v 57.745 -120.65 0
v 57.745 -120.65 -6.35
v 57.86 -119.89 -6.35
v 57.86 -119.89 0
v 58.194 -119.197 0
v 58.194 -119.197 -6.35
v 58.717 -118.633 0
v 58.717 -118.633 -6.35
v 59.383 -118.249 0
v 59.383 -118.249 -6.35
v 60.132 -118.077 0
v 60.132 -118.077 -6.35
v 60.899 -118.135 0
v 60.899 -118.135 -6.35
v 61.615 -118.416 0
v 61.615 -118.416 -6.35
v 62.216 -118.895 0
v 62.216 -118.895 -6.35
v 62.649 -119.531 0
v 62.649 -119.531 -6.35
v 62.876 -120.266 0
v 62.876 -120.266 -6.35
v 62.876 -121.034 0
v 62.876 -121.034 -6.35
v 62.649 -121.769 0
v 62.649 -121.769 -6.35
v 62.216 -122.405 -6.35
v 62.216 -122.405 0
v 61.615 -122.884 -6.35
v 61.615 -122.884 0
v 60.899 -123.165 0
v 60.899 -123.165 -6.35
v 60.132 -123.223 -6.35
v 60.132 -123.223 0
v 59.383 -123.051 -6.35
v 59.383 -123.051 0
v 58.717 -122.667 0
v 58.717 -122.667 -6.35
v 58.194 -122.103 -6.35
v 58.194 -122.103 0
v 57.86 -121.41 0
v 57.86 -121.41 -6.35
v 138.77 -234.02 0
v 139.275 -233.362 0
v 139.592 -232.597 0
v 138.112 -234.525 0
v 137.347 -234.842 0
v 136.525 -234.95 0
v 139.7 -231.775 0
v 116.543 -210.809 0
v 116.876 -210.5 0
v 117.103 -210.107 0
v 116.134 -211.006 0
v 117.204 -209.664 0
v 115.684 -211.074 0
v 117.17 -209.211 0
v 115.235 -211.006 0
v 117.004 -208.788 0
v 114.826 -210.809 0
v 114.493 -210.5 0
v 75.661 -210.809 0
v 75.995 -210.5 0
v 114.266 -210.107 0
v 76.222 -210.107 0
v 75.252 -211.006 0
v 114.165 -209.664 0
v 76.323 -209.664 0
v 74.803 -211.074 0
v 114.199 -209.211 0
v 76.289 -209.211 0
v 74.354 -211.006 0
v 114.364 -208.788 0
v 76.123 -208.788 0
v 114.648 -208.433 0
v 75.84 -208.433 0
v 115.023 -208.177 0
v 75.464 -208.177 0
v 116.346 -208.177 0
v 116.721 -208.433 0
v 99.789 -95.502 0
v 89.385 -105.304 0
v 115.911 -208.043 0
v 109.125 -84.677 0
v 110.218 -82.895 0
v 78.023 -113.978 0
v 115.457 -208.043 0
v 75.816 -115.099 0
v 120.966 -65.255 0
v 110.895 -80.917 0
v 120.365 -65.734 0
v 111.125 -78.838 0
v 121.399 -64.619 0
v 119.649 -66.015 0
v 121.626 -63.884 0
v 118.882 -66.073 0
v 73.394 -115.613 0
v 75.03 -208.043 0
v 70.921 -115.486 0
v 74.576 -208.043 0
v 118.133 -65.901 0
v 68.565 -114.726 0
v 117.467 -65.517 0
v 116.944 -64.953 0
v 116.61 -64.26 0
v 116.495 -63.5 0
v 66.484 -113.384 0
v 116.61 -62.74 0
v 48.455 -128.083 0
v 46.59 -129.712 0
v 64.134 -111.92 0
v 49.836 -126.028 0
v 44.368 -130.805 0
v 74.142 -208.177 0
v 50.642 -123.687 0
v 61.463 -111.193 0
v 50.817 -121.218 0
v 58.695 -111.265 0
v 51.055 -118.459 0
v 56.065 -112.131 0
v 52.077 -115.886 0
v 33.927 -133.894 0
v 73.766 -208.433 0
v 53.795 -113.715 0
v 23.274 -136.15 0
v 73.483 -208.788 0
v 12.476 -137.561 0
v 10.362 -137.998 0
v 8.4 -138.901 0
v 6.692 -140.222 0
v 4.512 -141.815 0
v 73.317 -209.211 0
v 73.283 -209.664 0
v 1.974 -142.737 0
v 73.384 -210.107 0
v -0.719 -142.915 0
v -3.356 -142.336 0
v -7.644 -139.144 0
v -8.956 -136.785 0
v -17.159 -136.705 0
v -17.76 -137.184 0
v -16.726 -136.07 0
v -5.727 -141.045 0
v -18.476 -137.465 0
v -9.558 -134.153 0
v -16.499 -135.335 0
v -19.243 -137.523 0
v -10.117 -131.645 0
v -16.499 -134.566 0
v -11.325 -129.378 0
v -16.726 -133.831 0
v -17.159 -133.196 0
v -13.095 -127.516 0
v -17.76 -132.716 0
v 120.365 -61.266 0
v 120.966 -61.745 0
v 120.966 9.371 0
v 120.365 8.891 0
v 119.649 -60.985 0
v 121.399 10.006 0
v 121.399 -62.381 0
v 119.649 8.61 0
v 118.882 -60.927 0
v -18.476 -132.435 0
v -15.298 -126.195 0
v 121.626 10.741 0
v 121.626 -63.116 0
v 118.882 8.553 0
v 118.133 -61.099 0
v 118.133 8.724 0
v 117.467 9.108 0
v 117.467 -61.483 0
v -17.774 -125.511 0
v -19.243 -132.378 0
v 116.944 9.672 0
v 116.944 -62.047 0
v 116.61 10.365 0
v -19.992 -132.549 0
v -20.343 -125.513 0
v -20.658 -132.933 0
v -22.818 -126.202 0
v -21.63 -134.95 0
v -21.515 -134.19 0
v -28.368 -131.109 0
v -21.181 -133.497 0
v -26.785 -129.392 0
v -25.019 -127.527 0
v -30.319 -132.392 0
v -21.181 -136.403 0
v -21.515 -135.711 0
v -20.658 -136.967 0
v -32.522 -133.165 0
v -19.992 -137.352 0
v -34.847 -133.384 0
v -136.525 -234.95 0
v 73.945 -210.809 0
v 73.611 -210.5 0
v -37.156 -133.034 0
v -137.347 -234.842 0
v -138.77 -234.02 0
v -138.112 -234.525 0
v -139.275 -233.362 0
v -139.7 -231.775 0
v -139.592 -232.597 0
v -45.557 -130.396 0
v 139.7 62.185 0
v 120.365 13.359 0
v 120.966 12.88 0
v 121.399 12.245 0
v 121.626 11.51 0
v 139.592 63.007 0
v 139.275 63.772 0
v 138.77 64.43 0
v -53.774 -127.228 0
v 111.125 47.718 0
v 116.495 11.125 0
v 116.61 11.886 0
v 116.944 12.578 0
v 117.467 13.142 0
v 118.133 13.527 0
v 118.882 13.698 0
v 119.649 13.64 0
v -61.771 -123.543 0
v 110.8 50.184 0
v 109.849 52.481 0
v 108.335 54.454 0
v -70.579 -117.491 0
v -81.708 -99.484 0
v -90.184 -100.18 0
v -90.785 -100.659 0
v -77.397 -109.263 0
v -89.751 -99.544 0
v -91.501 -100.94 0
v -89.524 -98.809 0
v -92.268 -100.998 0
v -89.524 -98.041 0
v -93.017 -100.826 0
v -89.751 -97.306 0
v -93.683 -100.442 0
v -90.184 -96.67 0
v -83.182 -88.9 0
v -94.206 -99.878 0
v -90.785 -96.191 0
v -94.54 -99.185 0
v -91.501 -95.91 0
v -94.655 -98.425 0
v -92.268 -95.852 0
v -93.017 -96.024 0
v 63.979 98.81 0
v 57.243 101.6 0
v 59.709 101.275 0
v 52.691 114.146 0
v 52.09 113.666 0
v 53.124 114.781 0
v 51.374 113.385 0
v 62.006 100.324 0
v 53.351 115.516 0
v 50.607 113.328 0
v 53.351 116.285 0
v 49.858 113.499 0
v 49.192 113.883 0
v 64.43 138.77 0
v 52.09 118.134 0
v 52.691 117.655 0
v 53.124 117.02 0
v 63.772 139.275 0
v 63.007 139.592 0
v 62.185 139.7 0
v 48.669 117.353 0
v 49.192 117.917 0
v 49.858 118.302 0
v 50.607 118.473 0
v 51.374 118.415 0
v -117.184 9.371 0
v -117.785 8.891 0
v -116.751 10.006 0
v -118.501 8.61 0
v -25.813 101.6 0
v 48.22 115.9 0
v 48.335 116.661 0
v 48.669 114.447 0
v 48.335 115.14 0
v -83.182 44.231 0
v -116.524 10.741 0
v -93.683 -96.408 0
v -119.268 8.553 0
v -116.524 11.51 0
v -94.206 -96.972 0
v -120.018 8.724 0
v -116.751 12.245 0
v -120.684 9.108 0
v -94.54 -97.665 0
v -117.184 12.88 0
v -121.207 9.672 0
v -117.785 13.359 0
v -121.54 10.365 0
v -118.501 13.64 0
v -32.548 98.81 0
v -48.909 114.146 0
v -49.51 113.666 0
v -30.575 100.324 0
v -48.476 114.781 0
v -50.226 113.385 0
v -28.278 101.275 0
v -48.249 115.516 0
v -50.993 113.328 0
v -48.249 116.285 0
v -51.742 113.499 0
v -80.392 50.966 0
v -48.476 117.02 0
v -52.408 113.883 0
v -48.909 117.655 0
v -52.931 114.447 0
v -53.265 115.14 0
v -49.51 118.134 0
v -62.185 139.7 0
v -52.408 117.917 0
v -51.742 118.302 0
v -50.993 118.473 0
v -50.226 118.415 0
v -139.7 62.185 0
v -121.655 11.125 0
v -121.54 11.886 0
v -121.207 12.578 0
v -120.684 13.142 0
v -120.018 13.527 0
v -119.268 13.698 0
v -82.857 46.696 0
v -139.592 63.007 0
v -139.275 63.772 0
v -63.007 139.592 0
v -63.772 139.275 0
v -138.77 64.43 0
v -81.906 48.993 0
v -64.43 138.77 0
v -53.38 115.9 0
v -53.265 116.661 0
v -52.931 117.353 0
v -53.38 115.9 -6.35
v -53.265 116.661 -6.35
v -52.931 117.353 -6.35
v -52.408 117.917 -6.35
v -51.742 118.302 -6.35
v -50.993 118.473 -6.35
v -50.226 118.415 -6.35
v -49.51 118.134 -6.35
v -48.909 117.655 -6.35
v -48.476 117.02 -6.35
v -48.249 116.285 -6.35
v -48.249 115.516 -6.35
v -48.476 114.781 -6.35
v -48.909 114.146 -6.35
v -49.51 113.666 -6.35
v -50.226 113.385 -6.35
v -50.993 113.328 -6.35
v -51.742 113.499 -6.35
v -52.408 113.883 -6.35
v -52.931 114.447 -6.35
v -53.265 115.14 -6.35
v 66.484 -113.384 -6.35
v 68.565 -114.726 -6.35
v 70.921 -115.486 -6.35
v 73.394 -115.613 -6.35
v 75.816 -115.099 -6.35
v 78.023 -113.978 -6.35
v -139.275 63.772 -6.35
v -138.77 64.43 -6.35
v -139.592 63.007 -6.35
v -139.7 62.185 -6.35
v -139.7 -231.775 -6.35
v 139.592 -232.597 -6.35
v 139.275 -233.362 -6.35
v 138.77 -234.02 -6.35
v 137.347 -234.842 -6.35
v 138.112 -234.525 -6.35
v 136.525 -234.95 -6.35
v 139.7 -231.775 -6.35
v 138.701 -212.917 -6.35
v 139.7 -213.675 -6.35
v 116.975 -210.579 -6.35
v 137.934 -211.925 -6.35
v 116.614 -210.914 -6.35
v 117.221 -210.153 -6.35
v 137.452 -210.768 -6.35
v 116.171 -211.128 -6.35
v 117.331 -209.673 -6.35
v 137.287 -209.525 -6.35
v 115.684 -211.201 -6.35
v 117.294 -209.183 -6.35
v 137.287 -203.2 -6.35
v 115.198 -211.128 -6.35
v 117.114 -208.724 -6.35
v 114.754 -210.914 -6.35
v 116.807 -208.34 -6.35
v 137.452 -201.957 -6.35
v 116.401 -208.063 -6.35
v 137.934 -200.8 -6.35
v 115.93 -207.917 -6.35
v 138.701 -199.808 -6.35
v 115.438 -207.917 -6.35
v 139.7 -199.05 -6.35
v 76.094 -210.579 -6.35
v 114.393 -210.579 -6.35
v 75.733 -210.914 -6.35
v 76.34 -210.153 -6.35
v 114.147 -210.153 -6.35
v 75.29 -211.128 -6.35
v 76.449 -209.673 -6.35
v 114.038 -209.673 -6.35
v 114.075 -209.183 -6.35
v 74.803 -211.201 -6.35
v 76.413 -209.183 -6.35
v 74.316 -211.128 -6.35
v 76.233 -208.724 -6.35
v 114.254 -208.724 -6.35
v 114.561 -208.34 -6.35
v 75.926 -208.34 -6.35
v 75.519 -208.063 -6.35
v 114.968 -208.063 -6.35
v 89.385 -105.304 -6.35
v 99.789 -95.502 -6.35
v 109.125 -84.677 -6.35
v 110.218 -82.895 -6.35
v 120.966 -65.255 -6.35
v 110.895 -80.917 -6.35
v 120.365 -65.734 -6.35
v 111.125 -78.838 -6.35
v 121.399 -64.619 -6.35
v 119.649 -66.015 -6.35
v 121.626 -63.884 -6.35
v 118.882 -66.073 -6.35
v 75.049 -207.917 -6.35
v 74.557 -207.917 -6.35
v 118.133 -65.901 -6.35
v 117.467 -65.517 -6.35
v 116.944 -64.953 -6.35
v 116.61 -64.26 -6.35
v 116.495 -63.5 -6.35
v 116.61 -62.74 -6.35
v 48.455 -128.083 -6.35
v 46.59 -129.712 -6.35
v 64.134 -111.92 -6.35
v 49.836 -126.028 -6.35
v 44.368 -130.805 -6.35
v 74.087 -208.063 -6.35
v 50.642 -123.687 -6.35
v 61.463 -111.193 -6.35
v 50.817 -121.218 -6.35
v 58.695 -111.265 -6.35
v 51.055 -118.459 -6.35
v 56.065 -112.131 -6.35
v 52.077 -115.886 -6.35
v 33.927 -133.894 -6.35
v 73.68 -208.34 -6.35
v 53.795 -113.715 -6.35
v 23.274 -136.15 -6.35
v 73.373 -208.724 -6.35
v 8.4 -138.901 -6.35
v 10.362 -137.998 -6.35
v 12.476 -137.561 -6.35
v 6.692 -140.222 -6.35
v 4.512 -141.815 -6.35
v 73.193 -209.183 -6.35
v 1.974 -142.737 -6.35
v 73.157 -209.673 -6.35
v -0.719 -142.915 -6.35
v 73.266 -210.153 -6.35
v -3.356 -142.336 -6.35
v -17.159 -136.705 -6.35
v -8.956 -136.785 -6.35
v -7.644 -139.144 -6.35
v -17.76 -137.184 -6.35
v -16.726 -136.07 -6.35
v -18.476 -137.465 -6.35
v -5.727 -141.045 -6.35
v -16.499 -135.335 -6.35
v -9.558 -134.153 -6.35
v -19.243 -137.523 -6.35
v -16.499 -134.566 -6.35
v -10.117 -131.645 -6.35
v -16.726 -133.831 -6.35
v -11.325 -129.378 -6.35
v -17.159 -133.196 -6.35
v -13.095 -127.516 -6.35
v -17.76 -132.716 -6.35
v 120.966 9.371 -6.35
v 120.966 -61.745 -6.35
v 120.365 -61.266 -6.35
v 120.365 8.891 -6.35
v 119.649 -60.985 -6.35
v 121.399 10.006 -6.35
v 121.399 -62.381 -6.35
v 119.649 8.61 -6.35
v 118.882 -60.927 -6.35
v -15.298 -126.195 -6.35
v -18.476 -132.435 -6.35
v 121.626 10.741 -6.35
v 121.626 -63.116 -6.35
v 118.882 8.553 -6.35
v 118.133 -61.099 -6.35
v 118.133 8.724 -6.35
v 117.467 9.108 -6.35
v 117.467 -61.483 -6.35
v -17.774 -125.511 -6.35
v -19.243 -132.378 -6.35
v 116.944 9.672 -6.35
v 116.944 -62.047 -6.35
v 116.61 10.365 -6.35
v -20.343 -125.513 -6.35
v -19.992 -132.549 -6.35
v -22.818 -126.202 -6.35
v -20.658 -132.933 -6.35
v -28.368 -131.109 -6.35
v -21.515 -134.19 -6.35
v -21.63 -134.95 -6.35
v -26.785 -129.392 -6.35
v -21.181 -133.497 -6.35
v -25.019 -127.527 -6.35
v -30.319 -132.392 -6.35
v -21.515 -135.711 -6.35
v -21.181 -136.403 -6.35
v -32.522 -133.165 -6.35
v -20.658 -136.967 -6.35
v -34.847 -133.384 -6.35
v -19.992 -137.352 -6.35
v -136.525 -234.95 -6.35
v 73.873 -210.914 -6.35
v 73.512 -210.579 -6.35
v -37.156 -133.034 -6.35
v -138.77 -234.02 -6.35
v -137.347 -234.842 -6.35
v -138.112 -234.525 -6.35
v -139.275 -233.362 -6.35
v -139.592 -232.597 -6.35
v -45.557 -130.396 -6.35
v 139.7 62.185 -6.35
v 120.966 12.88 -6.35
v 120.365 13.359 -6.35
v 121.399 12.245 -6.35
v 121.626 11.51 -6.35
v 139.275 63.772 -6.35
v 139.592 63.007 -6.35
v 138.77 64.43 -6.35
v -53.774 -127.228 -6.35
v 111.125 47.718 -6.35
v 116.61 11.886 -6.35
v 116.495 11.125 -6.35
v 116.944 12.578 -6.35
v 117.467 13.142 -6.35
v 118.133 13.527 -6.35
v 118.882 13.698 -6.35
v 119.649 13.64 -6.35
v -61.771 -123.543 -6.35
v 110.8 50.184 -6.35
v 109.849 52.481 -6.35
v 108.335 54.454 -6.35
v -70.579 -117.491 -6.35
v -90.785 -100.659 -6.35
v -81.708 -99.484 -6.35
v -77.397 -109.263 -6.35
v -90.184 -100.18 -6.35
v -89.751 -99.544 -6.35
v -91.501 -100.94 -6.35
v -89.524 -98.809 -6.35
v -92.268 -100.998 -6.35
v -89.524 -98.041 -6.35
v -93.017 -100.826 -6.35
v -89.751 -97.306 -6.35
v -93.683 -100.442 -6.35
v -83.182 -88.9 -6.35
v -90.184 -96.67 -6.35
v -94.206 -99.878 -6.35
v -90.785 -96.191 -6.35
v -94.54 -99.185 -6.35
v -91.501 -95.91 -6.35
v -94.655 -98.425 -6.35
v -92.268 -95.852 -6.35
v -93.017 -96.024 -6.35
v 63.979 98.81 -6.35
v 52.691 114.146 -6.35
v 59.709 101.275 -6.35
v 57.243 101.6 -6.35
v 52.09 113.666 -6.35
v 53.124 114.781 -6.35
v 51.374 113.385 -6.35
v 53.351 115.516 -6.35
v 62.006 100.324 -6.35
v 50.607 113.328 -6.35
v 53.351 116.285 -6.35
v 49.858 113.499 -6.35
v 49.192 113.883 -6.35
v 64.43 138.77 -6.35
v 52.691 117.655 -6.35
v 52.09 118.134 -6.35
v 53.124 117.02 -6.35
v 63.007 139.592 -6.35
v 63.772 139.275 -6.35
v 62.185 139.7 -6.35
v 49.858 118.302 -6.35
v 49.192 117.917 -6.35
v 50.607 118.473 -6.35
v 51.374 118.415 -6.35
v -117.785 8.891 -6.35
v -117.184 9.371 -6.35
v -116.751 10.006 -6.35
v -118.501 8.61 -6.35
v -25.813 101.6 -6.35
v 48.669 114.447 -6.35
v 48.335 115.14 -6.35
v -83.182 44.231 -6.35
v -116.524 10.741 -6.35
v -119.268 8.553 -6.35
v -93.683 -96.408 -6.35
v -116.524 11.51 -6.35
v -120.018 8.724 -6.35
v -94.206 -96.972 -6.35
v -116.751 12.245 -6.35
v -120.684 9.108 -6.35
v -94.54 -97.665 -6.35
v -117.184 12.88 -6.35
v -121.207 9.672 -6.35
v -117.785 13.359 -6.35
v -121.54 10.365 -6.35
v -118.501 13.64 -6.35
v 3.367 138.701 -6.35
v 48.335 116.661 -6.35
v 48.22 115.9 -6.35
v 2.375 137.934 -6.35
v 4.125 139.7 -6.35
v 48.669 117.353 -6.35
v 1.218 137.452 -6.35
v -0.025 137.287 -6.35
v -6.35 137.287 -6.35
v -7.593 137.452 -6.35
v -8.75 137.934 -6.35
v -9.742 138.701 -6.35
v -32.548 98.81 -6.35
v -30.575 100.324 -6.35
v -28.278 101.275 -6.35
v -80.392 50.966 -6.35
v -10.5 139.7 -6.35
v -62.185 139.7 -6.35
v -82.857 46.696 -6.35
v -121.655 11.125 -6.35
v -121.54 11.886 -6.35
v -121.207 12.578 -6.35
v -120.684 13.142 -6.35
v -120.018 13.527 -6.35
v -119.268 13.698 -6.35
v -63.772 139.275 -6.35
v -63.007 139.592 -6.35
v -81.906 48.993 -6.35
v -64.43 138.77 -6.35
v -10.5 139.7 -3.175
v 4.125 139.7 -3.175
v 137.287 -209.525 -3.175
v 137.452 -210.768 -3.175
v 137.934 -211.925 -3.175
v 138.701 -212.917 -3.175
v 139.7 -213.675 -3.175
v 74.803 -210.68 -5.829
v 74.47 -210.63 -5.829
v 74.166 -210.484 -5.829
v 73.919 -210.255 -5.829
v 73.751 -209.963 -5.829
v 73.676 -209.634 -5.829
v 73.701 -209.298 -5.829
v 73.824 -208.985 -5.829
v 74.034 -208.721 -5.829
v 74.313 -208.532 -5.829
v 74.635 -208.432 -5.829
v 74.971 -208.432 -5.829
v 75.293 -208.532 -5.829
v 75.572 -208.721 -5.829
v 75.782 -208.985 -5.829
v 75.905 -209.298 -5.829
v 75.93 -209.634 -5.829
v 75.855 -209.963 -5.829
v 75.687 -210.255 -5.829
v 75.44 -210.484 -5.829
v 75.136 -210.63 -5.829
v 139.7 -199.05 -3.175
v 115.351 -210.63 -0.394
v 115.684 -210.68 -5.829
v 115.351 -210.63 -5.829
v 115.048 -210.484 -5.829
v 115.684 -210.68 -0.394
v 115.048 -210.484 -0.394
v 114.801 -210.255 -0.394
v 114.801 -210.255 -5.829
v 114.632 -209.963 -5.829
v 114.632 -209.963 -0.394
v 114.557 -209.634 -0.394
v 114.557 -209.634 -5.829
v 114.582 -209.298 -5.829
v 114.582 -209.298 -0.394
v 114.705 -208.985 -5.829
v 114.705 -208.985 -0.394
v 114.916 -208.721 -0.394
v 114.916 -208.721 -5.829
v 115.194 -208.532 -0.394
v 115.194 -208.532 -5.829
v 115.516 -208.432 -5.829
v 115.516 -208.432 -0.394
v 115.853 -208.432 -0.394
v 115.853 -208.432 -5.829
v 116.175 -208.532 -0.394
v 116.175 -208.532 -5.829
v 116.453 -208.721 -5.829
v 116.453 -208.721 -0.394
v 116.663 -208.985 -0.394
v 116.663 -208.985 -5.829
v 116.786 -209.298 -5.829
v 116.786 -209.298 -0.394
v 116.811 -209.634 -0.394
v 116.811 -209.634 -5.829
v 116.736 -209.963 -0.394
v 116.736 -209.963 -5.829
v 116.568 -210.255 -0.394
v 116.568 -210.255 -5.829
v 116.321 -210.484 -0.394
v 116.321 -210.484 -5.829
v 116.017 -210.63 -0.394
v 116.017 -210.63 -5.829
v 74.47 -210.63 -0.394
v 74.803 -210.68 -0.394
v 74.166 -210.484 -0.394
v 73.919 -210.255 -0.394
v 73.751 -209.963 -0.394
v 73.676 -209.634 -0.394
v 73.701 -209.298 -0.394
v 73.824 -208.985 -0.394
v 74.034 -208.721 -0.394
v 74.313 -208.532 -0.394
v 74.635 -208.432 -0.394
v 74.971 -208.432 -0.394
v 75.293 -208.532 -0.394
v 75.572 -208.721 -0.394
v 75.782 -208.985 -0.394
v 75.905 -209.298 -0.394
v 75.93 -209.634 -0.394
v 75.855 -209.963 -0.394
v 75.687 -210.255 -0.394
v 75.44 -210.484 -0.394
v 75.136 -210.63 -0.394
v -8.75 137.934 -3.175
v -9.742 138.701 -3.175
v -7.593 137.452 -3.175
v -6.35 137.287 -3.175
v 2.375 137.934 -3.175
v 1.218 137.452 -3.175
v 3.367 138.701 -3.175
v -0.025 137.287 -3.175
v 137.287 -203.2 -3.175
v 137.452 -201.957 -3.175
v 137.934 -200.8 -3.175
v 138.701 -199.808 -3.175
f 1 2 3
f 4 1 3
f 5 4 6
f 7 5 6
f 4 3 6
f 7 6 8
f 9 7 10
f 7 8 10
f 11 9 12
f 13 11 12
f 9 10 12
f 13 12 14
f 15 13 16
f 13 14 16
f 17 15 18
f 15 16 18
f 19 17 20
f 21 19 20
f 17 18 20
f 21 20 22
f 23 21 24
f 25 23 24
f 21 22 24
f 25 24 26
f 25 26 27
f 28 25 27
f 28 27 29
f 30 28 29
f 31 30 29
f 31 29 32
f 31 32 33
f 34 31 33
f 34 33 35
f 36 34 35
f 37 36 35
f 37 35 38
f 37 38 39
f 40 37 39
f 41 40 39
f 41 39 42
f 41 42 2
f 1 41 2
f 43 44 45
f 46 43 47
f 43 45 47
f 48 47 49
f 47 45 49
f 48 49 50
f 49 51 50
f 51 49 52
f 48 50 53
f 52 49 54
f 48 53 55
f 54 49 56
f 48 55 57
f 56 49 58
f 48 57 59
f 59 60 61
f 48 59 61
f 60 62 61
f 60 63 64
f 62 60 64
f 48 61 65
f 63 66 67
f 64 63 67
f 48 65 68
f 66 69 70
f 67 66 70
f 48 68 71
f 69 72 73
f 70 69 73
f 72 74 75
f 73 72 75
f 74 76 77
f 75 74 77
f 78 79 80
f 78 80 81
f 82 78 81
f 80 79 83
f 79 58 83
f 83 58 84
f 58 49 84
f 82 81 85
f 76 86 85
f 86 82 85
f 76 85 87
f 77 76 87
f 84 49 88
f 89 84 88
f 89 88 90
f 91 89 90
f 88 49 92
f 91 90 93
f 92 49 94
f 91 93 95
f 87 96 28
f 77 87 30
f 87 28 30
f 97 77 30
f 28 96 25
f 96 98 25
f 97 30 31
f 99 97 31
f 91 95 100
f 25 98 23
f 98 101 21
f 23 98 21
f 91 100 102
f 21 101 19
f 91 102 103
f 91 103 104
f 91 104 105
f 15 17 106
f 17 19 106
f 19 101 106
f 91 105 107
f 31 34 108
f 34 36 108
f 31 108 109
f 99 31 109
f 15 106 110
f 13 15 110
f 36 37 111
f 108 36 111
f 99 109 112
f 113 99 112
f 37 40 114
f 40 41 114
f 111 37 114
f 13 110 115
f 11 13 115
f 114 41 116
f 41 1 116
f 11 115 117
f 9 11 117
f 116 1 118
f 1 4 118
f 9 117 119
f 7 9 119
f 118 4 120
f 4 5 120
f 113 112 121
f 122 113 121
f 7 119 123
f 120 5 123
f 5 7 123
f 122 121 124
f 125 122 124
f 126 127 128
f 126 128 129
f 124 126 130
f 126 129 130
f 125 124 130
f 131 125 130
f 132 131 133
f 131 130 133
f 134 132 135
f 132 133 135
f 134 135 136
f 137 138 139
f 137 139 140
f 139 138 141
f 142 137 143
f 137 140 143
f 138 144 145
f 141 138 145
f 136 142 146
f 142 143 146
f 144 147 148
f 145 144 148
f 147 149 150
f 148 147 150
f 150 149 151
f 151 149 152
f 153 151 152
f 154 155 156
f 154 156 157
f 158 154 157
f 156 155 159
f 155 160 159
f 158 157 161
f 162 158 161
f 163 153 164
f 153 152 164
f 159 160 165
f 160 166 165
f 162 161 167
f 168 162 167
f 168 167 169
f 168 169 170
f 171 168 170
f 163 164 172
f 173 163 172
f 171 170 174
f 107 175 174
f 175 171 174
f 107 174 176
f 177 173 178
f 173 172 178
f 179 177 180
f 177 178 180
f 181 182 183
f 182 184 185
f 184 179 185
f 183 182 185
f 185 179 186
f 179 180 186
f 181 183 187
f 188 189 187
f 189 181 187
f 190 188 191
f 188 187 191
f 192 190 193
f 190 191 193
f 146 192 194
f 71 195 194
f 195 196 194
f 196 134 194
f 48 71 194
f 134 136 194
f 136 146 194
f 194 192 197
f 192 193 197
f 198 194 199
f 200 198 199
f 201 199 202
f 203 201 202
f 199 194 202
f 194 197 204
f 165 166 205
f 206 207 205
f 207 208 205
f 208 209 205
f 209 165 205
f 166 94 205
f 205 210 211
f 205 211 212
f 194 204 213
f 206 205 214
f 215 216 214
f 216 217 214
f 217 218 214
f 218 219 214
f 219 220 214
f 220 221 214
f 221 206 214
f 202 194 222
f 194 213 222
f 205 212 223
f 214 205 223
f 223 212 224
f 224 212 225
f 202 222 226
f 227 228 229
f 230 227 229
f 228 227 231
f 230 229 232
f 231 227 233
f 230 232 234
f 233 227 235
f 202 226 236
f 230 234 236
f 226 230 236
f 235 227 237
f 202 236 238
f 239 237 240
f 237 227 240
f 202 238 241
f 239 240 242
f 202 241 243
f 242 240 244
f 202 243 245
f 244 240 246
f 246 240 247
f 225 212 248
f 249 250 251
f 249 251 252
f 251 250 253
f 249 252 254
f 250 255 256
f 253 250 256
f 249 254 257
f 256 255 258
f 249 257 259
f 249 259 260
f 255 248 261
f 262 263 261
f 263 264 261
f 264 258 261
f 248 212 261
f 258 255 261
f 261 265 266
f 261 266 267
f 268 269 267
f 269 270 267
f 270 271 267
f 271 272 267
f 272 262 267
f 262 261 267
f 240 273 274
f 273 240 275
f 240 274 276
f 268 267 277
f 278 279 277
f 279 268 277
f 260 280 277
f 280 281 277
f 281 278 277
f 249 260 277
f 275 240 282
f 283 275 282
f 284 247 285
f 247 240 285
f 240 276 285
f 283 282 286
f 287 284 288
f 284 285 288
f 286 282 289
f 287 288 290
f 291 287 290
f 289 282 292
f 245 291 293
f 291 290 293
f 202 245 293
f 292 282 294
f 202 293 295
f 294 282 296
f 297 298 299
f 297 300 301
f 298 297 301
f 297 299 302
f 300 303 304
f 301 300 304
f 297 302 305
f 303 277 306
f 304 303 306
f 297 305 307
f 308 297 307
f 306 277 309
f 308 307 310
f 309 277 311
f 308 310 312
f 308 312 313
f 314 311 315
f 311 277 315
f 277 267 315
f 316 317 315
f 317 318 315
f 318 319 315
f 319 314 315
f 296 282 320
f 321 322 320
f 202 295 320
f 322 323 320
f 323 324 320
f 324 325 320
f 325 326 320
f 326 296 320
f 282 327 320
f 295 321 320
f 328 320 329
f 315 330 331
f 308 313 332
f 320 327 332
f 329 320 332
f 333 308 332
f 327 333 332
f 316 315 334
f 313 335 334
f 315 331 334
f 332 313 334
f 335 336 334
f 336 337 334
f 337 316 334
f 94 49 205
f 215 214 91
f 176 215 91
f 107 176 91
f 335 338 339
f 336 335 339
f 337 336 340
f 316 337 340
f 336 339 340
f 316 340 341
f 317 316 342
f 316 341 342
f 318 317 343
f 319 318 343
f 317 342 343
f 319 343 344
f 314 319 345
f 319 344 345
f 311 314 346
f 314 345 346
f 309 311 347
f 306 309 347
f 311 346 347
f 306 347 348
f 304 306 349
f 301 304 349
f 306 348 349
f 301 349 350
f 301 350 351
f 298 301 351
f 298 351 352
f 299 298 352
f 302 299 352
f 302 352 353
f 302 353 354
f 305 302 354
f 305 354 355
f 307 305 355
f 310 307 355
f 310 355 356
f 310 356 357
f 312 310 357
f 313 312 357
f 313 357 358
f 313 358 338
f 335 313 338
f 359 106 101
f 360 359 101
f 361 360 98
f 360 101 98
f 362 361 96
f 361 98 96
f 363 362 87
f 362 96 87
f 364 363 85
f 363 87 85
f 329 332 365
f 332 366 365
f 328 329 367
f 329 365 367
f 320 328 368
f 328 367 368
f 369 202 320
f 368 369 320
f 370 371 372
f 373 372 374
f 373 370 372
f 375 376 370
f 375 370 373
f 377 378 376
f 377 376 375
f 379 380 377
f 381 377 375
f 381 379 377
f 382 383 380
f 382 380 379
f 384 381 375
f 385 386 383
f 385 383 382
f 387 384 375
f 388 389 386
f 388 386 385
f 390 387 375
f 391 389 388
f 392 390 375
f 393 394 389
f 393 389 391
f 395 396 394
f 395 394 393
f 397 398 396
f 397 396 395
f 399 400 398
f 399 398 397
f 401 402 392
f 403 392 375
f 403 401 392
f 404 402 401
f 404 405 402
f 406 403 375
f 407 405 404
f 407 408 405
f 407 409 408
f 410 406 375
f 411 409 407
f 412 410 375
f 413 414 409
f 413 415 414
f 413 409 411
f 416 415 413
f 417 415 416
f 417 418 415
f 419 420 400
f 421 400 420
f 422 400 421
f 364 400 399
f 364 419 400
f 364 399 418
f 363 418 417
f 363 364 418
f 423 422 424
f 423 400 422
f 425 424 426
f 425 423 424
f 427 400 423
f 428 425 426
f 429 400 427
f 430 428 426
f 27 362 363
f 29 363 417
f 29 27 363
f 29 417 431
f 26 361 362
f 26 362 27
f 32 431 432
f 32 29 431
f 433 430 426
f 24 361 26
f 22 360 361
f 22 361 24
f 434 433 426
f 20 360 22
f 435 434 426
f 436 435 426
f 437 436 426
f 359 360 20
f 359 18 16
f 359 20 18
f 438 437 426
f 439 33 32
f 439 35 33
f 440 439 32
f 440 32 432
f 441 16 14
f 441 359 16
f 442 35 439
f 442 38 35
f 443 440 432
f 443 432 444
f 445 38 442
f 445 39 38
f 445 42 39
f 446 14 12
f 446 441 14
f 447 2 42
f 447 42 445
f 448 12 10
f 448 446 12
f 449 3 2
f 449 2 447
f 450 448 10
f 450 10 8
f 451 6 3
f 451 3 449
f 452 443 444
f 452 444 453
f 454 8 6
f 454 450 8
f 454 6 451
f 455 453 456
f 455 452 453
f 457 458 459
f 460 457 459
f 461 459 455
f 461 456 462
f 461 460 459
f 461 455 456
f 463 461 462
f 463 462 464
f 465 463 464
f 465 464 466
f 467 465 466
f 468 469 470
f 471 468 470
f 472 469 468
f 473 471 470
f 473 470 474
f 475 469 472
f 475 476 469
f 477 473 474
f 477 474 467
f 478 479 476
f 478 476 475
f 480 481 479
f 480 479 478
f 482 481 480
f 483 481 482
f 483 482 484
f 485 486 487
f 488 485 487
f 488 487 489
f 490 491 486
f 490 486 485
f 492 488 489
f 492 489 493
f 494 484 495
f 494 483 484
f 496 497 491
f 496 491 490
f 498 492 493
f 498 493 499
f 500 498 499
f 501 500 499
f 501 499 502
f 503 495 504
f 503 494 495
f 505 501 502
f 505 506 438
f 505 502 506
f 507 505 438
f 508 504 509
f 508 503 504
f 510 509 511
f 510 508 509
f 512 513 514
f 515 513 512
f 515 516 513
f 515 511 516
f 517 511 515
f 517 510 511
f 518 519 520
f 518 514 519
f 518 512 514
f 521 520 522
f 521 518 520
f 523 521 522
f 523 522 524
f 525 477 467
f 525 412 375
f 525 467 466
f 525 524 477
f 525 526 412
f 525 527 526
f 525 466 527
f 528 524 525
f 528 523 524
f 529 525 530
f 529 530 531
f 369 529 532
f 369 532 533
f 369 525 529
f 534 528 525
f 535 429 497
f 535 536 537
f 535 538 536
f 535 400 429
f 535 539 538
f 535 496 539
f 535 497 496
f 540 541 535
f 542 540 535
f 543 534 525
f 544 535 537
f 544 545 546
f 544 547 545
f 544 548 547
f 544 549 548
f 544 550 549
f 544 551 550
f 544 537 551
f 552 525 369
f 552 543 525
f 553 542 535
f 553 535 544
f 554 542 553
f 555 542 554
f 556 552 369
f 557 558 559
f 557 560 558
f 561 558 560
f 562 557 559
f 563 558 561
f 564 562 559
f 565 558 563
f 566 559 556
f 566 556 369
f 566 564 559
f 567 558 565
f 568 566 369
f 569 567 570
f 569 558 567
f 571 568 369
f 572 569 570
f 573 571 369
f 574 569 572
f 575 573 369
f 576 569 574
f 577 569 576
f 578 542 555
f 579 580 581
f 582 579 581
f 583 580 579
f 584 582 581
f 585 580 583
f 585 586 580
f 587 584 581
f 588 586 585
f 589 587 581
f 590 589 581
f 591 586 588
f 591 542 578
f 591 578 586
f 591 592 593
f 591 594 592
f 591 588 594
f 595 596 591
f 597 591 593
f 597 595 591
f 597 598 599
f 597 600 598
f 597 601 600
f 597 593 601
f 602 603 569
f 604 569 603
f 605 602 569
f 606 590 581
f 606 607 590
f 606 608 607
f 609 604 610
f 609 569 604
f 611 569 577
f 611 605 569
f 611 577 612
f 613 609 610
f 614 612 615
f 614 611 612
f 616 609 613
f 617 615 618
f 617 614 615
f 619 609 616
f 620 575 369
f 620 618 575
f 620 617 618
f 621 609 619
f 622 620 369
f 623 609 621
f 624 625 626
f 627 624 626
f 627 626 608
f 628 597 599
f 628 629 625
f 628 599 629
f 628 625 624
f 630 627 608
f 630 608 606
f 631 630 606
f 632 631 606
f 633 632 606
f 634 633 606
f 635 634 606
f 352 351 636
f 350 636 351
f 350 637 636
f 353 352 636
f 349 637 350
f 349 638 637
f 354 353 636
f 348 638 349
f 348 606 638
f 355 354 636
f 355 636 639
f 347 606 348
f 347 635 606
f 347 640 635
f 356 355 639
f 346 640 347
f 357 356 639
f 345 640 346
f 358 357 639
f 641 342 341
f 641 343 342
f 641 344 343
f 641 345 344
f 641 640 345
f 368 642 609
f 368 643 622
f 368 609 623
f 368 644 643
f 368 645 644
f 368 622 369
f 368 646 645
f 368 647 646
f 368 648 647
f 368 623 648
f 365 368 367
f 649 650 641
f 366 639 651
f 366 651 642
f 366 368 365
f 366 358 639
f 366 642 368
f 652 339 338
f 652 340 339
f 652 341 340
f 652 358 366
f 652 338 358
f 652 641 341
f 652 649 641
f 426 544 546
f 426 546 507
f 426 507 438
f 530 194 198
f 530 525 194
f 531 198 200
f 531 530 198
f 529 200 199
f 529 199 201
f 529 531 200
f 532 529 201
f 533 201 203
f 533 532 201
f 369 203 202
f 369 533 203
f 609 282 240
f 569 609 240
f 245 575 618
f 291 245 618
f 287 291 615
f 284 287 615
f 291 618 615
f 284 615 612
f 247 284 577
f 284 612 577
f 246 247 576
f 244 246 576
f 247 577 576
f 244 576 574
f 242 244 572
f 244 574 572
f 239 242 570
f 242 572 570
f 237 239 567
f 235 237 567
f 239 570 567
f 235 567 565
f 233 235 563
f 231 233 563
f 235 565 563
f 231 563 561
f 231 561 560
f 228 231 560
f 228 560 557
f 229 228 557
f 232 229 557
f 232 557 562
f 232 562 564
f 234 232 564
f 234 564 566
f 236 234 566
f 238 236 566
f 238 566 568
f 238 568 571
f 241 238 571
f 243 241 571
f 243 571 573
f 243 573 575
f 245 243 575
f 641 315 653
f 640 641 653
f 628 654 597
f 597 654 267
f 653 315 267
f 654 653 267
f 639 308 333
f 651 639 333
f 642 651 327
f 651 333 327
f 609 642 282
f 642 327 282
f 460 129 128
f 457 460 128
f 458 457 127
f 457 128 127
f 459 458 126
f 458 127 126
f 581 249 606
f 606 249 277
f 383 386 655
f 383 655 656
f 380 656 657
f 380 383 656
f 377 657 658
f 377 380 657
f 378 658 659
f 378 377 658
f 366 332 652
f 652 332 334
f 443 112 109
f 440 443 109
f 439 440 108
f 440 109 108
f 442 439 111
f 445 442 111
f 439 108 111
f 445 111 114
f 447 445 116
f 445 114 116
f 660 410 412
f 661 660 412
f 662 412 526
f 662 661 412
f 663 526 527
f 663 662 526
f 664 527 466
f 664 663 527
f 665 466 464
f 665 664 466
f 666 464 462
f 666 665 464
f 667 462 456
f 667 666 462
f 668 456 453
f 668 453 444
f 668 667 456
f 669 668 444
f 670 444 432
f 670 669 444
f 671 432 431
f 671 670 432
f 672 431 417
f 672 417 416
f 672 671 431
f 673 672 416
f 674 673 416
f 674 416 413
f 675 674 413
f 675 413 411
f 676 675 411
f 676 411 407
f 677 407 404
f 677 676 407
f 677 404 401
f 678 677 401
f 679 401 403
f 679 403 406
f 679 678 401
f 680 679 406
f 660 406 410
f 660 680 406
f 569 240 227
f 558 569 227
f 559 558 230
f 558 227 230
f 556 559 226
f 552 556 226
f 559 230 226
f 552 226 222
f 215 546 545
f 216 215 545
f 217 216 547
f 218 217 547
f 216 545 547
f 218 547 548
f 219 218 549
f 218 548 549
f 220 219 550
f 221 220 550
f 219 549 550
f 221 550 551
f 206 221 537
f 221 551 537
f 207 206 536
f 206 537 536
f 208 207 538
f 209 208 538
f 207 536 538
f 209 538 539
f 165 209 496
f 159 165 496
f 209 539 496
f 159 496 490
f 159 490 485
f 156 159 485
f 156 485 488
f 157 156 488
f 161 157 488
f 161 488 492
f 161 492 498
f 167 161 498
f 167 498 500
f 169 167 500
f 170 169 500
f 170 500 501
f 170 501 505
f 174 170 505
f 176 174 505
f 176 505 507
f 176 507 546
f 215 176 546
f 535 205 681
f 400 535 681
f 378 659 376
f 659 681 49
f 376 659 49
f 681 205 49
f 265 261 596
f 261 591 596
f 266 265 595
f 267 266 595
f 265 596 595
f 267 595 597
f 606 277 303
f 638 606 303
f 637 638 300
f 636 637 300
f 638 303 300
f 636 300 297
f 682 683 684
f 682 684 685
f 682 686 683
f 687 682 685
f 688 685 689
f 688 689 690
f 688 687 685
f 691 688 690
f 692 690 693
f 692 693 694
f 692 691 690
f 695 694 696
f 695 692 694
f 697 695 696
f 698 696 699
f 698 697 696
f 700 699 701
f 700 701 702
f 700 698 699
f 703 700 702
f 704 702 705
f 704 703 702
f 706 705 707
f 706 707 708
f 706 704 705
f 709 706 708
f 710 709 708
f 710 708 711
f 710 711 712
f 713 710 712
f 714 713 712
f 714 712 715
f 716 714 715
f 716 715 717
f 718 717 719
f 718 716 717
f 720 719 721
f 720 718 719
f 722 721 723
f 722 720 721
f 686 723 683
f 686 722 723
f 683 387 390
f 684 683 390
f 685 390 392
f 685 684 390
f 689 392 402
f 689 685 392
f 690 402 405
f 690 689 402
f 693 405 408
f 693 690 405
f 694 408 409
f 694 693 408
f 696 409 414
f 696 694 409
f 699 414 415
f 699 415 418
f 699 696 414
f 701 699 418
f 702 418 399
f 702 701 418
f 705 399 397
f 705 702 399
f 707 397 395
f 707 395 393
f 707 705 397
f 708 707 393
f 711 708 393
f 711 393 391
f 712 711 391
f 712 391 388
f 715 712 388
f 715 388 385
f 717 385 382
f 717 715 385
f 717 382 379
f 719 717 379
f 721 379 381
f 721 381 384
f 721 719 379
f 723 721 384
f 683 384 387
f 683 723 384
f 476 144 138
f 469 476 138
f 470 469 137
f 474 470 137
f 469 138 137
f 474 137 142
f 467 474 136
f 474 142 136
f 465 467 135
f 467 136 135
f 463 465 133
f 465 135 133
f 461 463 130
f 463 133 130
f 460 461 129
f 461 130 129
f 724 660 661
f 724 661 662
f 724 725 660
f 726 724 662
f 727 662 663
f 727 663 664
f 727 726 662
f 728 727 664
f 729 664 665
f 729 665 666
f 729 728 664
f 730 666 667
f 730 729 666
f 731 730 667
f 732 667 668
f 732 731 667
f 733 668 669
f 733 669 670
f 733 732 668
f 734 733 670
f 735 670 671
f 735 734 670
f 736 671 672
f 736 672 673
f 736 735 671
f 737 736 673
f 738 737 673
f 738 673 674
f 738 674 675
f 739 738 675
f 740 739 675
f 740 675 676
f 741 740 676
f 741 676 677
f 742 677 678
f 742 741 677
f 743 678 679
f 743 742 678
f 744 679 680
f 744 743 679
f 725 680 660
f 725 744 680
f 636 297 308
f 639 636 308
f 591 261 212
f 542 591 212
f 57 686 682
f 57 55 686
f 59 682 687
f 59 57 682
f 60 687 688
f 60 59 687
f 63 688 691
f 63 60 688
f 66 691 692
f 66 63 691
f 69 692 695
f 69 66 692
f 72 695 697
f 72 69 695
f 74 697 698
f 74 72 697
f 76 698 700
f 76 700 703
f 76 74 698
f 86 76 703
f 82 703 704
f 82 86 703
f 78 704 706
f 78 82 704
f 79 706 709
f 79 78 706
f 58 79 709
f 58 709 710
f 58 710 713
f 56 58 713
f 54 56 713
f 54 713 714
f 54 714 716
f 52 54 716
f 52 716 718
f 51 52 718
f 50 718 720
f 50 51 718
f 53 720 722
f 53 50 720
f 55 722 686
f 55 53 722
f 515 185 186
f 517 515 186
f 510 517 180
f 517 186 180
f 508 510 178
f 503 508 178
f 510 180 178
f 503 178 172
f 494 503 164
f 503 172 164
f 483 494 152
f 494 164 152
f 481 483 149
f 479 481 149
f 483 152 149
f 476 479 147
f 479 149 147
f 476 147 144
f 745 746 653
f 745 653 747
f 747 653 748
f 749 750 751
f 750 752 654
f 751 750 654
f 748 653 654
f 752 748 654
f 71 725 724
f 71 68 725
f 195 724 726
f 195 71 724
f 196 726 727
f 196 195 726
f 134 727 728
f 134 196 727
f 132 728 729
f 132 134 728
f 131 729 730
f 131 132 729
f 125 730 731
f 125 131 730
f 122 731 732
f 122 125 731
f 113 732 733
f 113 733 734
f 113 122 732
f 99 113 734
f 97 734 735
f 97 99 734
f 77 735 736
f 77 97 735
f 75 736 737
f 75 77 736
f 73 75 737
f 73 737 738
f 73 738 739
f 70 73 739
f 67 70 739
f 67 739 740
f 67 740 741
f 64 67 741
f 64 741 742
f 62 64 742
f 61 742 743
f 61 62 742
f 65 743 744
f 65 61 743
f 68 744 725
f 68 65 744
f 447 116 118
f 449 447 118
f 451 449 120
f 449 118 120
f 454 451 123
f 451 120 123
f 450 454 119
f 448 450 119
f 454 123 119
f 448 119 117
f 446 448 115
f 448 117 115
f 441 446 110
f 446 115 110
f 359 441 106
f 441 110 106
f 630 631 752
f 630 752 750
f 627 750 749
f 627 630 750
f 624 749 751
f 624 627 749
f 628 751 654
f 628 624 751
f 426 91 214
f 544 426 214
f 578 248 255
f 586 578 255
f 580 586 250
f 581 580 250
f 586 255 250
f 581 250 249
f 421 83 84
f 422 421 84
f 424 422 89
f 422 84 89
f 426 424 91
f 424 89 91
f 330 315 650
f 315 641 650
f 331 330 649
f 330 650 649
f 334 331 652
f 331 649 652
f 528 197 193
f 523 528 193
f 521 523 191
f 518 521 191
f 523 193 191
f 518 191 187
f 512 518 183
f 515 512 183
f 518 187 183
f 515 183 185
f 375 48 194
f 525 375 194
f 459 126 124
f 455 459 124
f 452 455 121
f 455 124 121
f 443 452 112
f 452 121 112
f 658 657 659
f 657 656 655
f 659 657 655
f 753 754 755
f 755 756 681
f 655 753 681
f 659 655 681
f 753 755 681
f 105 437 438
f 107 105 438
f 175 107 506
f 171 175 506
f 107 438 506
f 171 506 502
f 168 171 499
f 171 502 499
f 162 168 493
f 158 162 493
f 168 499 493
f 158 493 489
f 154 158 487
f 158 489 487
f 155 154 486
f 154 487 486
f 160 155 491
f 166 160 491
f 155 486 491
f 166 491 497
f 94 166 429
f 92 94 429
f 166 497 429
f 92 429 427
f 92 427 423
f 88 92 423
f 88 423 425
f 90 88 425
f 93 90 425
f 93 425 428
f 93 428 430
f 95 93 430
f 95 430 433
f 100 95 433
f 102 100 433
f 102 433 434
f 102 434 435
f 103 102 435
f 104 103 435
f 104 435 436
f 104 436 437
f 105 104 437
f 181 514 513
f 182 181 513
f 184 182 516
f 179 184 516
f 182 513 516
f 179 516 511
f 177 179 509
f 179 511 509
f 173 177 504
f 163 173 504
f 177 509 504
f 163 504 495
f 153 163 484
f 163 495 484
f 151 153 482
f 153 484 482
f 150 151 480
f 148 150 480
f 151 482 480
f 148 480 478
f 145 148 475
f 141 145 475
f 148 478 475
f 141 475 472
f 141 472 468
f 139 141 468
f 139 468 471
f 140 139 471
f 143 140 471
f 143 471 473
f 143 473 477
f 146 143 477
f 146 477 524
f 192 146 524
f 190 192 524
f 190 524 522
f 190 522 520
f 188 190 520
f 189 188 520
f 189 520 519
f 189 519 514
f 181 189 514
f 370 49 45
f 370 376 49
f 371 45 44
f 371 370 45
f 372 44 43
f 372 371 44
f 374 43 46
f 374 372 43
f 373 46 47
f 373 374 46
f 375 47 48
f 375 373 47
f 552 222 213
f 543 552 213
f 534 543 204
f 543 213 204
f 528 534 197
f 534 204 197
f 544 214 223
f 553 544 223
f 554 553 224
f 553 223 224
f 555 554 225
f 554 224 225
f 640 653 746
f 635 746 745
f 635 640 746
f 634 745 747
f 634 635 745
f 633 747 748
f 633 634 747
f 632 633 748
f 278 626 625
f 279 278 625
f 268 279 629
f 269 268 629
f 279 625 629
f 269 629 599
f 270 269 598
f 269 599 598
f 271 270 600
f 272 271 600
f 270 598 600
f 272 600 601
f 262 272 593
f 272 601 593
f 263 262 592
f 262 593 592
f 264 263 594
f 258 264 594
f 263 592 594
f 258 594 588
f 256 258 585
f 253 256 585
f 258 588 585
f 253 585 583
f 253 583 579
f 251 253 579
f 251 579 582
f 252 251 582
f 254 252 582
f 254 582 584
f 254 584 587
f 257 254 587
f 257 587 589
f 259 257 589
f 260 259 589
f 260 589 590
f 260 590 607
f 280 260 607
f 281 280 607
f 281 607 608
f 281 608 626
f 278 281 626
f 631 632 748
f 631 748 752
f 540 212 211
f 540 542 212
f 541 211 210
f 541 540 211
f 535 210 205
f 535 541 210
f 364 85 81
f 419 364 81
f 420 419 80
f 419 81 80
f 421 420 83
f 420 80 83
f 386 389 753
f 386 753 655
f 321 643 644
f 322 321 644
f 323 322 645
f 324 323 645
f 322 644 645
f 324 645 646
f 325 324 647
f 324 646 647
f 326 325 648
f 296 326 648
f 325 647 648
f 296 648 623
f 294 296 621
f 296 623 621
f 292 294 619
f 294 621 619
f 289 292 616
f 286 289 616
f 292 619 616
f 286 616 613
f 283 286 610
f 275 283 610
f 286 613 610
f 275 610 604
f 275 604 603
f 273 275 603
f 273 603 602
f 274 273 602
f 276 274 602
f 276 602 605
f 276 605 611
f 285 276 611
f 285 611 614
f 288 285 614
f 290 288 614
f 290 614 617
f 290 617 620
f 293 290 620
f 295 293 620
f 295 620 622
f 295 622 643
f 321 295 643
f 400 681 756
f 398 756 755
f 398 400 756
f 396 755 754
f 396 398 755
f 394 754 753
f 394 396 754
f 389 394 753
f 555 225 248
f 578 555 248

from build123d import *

# Parameters (mm, degrees)
BOSS_EXTRUDE1_DEPTH              = 6.35
F_13_64_0_20313_DIAMETER_HOLE1_D = 5.159502
FILLET1_R                        = 3.175
CUT_EXTRUDE1_DEPTH               = 3.175
F_4_40_TAPPED_HOLE1_AT_2_COUNT   = 2
F_4_40_TAPPED_HOLE1_AT_2_PITCH   = 40.8813


with BuildPart() as part:
    # Sketch1 → Boss-Extrude1 (new body)
    with BuildSketch(Plane.XY):
        Polygon((63.5, 139.7), (139.7, 63.5), (139.7, -234.95), (-139.7, -234.95), (-139.7, 63.5), (-63.5, 139.7), align=None)
        with BuildLine():
            Line((-32.547758941, 98.810192091), (-80.392170491, 50.965780541))
            ThreePointArc((-80.392170491, 50.965780541), (-82.456930947, 47.875648143), (-83.1819784, 44.23058845))
            Line((-83.1819784, 44.23058845), (-83.1819784, -88.9))
            ThreePointArc((-83.1819784, -88.9), (-77.397388735, -109.262606079), (-61.771467321, -123.542934642))
            ThreePointArc((-61.771467321, -123.542934642), (-49.690626762, -128.877509625), (-37.155545476, -133.033966773))
            ThreePointArc((-37.155545476, -133.033966773), (-31.397184902, -132.845734548), (-26.785398712, -129.39239182))
            ThreePointArc((-26.785398712, -129.39239182), (-16.51294166, -125.769298085), (-9.558427406, -134.152907902))
            ThreePointArc((-9.558427406, -134.152907902), (-3.356200416, -142.335772885), (6.691703581, -140.222357584))
            ThreePointArc((6.691703581, -140.222357584), (9.354962656, -138.393777353), (12.476251165, -137.560583133))
            ThreePointArc((12.476251165, -137.560583133), (28.622348201, -135.127095945), (44.368454999, -130.805241011))
            ThreePointArc((44.368454999, -130.805241011), (49.212504081, -127.100822664), (50.816921447, -121.217509676))
            ThreePointArc((50.816921447, -121.217509676), (56.065290503, -112.130581006), (66.483854873, -113.384042964))
            ThreePointArc((66.483854873, -113.384042964), (72.153155683, -115.630496863), (78.02311981, -113.977908606))
            ThreePointArc((78.02311981, -113.977908606), (94.714050954, -100.537651788), (109.125182698, -84.677419518))
            ThreePointArc((109.125182698, -84.677419518), (110.611187219, -81.924253334), (111.125, -78.838134428))
            Line((111.125, -78.838134428), (111.125, 47.718463274))
            ThreePointArc((111.125, 47.718463274), (110.399952547, 51.363522967), (108.335192091, 54.453655364))
            Line((108.335192091, 54.453655364), (63.978655364, 98.810192091))
            ThreePointArc((63.978655364, 98.810192091), (60.888522967, 100.874952547), (57.243463274, 101.6))
            Line((57.243463274, 101.6), (-25.81256685, 101.6))
            ThreePointArc((-25.81256685, 101.6), (-29.457626543, 100.874952547), (-32.547758941, 98.810192091))
        make_face(mode=Mode.SUBTRACT)
    extrude(amount=-BOSS_EXTRUDE1_DEPTH)

    # 13/64 (0.20313) Diameter Hole1 (through all)
    with Locations(Plane(origin=(-107.95, -107.95, 0), x_dir=(1, 0, 0), z_dir=(0, 0, 1))):
        with Locations((158.75, 223.8502), (57.15, 223.8502), (227.0252, 119.0752), (-11.1252, 119.0752), (227.0252, 44.45), (168.275, -12.7), (88.9, -27.0002), (15.875, 9.525)):
            Hole(F_13_64_0_20313_DIAMETER_HOLE1_D / 2)

    # Fillet1
    fillet1_edges = [part.edges().sort_by_distance(p)[0] for p in [
        (139.7, -234.95, -3.175),
        (-139.7, -234.95, -3.175),
        (-139.7, 63.5, -3.175),
        (-63.5, 139.7, -3.175),
        (63.5, 139.7, -3.175),
        (139.7, 63.5, -3.175),
    ]]
    fillet(fillet1_edges, radius=FILLET1_R)

    # Sketch11 → Cut-Extrude1 (cut)
    with BuildSketch(Plane(origin=(0, 0, -6.35), x_dir=(-1, 0, 0), z_dir=(0, 0, -1))):
        with BuildLine():
            Line((-177.07961661, -198.4248), (-142.0622, -198.4248))
            ThreePointArc((-142.0622, -198.4248), (-138.685623698, -199.823423698), (-137.287, -203.2))
            Line((-137.287, -203.2), (-137.287, -209.5246))
            ThreePointArc((-137.287, -209.5246), (-138.685623698, -212.901176302), (-142.0622, -214.2998))
            Line((-142.0622, -214.2998), (-177.07961661, -214.2998))
            Line((-177.07961661, -214.2998), (-177.07961661, -198.4248))
        make_face()
        with BuildLine():
            Line((-4.7498, 156.359665344), (11.1252, 156.359665344))
            Line((11.1252, 156.359665344), (11.1252, 142.0622))
            ThreePointArc((11.1252, 142.0622), (9.726576302, 138.685623698), (6.35, 137.287))
            Line((6.35, 137.287), (0.0254, 137.287))
            ThreePointArc((0.0254, 137.287), (-3.351176302, 138.685623698), (-4.7498, 142.0622))
            Line((-4.7498, 142.0622), (-4.7498, 156.359665344))
        make_face()
    extrude(amount=-CUT_EXTRUDE1_DEPTH, mode=Mode.SUBTRACT)

    # Sketch14 → #4-40 Tapped Hole1 (revolve, cut)
    with BuildSketch(Plane(origin=(115.6843, -209.55, 0), x_dir=(0, -1, 0), z_dir=(1, 0, 0))):
        Polygon((0, 0), (0, 6.35), (1.651, 6.35), (1.1303, 5.8293), (1.1303, 0.3937), (1.524, 0), align=None)
    f_4_40_tapped_hole1 = revolve(axis=Axis((115.6843, -209.55, 6.35), (0, 0, -1)), mode=Mode.SUBTRACT)

    # #4-40 Tapped Hole1 at 2: #4-40 Tapped Hole1 ×2
    with Locations(*[(-i * F_4_40_TAPPED_HOLE1_AT_2_PITCH, 0, 0) for i in range(1, F_4_40_TAPPED_HOLE1_AT_2_COUNT)]):
        add(f_4_40_tapped_hole1, mode=Mode.SUBTRACT)


solid = part.part
